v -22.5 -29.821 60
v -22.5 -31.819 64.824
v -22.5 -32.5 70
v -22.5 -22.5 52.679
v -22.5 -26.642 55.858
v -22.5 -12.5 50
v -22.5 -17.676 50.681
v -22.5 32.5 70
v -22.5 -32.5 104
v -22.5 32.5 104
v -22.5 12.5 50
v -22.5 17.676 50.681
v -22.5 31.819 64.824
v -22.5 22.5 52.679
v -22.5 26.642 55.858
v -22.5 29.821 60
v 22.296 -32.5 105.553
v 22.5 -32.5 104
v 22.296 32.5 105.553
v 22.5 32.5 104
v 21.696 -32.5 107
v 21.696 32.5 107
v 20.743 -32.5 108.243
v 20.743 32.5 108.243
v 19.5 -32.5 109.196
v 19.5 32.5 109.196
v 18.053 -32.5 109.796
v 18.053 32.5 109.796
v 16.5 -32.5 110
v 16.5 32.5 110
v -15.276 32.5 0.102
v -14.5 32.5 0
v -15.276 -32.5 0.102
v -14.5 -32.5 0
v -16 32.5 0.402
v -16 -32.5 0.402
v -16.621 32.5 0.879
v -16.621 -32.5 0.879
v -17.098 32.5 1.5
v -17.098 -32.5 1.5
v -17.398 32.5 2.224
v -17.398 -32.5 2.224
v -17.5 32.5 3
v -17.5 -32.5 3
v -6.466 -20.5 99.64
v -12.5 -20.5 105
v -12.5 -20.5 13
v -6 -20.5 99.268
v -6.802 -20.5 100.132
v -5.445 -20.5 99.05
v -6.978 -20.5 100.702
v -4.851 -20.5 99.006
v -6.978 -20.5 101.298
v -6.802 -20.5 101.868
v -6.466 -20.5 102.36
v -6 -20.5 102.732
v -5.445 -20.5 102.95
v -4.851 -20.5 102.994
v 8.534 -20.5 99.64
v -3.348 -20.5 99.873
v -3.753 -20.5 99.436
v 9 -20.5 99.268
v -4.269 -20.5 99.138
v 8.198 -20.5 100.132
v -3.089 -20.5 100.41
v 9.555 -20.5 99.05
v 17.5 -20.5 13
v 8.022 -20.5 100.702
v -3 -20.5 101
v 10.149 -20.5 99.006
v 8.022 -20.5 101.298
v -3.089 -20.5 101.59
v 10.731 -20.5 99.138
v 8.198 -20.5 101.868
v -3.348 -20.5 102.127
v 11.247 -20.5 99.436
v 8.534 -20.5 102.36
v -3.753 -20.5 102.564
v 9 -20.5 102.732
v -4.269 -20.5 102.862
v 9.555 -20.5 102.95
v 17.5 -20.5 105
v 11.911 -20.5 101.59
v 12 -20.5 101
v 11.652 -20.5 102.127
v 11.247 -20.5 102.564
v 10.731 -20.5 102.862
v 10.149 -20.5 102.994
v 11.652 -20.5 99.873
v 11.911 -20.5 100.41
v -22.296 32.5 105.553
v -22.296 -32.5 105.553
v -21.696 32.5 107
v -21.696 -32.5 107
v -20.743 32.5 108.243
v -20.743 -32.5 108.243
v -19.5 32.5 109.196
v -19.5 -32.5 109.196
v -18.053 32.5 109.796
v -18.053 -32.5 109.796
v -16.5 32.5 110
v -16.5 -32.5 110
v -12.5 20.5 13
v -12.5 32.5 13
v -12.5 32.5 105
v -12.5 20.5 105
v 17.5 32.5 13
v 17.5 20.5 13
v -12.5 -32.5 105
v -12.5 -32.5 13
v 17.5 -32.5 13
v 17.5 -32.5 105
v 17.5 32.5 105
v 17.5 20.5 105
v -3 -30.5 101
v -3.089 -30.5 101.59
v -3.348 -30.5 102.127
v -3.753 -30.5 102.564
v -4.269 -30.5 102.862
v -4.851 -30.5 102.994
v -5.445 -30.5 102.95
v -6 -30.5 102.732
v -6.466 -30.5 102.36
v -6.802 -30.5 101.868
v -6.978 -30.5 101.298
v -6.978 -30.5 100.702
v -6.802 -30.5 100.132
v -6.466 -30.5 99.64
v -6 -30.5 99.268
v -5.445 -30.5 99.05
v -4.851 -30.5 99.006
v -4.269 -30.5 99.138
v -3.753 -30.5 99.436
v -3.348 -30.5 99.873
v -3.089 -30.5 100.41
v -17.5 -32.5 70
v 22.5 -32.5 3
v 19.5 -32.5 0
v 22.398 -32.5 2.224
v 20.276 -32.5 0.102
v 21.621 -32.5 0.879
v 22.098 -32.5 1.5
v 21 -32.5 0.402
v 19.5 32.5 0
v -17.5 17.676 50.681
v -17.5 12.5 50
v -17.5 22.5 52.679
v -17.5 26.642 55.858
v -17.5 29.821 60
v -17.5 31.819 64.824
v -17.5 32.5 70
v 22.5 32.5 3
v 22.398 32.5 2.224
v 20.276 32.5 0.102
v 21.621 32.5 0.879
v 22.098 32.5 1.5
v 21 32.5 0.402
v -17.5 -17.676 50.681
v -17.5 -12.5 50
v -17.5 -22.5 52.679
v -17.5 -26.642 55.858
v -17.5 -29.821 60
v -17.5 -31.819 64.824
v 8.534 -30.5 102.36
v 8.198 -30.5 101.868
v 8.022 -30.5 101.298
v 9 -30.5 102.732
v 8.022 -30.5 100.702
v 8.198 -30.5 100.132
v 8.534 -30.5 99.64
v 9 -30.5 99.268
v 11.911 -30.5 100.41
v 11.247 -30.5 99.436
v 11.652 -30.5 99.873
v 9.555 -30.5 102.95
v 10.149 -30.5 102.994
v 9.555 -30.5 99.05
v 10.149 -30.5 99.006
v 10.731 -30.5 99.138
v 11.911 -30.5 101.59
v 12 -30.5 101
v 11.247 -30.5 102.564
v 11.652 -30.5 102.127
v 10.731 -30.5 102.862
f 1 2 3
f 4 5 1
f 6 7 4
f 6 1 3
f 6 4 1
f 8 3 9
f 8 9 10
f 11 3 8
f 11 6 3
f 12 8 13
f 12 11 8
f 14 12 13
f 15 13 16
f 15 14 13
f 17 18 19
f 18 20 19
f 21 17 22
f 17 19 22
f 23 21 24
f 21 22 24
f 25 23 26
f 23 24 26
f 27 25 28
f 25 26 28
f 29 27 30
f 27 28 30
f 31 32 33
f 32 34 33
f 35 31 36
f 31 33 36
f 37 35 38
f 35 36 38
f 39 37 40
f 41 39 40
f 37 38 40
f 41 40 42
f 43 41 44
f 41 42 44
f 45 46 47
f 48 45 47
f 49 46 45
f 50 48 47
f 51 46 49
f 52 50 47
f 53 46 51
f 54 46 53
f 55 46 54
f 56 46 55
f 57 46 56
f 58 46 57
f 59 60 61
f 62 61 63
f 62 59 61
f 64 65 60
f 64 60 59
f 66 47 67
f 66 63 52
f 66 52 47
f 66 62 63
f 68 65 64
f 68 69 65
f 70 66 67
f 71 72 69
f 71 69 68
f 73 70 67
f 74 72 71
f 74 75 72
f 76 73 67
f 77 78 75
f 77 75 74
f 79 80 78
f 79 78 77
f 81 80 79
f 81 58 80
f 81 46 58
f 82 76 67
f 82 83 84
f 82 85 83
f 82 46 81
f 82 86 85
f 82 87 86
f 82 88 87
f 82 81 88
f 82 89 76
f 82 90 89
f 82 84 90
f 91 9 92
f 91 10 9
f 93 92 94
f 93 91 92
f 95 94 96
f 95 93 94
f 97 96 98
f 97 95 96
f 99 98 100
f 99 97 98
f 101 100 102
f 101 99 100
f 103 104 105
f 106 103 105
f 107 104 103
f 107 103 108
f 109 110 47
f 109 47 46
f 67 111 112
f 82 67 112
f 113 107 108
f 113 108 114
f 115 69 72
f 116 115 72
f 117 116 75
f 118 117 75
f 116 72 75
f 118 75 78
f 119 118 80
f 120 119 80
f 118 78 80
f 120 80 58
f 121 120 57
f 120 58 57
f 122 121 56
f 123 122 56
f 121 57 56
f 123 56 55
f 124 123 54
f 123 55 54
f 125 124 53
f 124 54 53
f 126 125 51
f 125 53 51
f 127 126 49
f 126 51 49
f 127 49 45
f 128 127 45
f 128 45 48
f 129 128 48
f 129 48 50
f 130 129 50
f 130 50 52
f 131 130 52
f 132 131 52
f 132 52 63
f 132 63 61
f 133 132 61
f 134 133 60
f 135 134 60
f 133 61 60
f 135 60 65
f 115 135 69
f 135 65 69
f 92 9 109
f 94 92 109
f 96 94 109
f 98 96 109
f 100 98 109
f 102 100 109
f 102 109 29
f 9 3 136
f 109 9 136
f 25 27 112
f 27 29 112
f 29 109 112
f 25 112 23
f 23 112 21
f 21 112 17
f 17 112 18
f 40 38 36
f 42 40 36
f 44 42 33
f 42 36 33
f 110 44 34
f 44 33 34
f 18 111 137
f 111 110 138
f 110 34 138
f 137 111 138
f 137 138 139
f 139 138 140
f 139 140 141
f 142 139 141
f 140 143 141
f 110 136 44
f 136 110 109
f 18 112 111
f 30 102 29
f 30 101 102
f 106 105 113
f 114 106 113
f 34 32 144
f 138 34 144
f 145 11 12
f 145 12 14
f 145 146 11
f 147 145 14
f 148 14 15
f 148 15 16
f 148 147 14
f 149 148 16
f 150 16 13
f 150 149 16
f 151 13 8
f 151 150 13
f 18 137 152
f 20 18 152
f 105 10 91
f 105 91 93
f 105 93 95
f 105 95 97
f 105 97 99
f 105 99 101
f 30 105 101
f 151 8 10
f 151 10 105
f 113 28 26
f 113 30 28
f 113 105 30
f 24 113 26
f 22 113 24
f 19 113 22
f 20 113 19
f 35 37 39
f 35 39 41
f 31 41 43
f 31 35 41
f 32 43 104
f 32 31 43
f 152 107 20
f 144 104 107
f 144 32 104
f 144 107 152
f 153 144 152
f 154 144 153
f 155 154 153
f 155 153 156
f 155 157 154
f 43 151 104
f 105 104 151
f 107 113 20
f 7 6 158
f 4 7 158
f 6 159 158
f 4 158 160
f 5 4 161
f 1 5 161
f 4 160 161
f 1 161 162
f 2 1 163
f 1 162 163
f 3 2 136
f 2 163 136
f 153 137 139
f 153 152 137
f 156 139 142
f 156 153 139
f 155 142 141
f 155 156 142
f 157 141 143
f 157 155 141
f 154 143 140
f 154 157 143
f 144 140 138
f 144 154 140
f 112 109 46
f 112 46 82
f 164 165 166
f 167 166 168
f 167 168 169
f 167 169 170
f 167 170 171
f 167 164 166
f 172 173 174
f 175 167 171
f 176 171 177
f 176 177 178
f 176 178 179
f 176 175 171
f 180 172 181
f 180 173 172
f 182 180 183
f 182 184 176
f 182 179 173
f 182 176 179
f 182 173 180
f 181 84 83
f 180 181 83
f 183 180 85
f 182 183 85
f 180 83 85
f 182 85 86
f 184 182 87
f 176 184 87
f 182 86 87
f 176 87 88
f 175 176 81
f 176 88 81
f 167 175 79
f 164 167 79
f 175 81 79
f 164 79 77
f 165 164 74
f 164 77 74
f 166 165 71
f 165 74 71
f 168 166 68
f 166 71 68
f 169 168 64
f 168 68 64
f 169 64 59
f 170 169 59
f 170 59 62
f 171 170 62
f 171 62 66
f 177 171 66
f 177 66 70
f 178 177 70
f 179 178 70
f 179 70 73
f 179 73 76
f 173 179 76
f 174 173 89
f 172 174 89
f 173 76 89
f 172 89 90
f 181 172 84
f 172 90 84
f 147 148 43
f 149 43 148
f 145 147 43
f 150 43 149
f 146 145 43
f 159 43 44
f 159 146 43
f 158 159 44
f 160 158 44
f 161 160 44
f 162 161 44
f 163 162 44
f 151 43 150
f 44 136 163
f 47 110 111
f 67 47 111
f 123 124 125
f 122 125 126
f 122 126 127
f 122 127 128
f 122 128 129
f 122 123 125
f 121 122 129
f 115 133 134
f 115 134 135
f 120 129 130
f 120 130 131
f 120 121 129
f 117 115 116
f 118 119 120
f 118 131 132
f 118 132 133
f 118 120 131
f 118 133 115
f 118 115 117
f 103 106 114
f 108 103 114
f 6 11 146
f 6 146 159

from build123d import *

# Parameters (mm, degrees)
SKETCH025_W     = 45
SKETCH025_H     = 65
PAD010_DEPTH    = 110
FILLET009_R     = 6
SKETCH026_W     = 30
SKETCH026_H     = 92
POCKET013_DEPTH = 12
SKETCH027_R     = 2
PAD011_DEPTH    = 10
SKETCH028_W     = 65
SKETCH028_H     = 50
POCKET014_DEPTH = 5
FILLET010_R     = 20
FILLET011_R     = 3


with BuildPart() as part:
    # Sketch025 → Pad010 (new body)
    with BuildSketch(Plane.XY):
        Rectangle(SKETCH025_W, SKETCH025_H)
    extrude(amount=PAD010_DEPTH)

    # Fillet009
    fillet009_edges = [part.edges().sort_by_distance(p)[0] for p in [
        (-22.5, 0, 110),
        (22.5, 0, 110),
    ]]
    fillet(fillet009_edges, radius=FILLET009_R)

    # Sketch026 (on Face2 of Fillet009) → Pocket013 (cut)
    with BuildSketch(Plane.XZ.offset(32.5)):
        with Locations((2.5, 59)):
            Rectangle(SKETCH026_W, SKETCH026_H)
    pocket013 = extrude(amount=-POCKET013_DEPTH, mode=Mode.SUBTRACT)

    # Mirrored001: Pocket013 across XZ
    add(pocket013.mirror(Plane.XZ), mode=Mode.SUBTRACT)

    # Sketch027 (on Face17 of Mirrored001) → Pad011 (join)
    with BuildSketch(Plane.XZ.offset(20.5)):
        with Locations((-5, 101)):
            Circle(SKETCH027_R)
        with Locations((10, 101)):
            Circle(SKETCH027_R)
    extrude(amount=PAD011_DEPTH)

    # Sketch028 (on Face1 of Pad011) → Pocket014 (cut)
    with BuildSketch(Plane(origin=(-22.5, 0, 0), x_dir=(0, -1, 0), z_dir=(-1, 0, 0))):
        with Locations((0, 25)):
            Rectangle(SKETCH028_W, SKETCH028_H)
    extrude(amount=-POCKET014_DEPTH, mode=Mode.SUBTRACT)

    # Fillet010
    fillet010_edges = [part.edges().sort_by_distance(p)[0] for p in [
        (-20, 32.5, 50),
        (-20, -32.5, 50),
    ]]
    fillet(fillet010_edges, radius=FILLET010_R)

    # Fillet011
    fillet011_edges = [part.edges().sort_by_distance(p)[0] for p in [
        (-17.5, 0, 0),
        (22.5, 0, 0),
    ]]
    fillet(fillet011_edges, radius=FILLET011_R)


solid = part.part
